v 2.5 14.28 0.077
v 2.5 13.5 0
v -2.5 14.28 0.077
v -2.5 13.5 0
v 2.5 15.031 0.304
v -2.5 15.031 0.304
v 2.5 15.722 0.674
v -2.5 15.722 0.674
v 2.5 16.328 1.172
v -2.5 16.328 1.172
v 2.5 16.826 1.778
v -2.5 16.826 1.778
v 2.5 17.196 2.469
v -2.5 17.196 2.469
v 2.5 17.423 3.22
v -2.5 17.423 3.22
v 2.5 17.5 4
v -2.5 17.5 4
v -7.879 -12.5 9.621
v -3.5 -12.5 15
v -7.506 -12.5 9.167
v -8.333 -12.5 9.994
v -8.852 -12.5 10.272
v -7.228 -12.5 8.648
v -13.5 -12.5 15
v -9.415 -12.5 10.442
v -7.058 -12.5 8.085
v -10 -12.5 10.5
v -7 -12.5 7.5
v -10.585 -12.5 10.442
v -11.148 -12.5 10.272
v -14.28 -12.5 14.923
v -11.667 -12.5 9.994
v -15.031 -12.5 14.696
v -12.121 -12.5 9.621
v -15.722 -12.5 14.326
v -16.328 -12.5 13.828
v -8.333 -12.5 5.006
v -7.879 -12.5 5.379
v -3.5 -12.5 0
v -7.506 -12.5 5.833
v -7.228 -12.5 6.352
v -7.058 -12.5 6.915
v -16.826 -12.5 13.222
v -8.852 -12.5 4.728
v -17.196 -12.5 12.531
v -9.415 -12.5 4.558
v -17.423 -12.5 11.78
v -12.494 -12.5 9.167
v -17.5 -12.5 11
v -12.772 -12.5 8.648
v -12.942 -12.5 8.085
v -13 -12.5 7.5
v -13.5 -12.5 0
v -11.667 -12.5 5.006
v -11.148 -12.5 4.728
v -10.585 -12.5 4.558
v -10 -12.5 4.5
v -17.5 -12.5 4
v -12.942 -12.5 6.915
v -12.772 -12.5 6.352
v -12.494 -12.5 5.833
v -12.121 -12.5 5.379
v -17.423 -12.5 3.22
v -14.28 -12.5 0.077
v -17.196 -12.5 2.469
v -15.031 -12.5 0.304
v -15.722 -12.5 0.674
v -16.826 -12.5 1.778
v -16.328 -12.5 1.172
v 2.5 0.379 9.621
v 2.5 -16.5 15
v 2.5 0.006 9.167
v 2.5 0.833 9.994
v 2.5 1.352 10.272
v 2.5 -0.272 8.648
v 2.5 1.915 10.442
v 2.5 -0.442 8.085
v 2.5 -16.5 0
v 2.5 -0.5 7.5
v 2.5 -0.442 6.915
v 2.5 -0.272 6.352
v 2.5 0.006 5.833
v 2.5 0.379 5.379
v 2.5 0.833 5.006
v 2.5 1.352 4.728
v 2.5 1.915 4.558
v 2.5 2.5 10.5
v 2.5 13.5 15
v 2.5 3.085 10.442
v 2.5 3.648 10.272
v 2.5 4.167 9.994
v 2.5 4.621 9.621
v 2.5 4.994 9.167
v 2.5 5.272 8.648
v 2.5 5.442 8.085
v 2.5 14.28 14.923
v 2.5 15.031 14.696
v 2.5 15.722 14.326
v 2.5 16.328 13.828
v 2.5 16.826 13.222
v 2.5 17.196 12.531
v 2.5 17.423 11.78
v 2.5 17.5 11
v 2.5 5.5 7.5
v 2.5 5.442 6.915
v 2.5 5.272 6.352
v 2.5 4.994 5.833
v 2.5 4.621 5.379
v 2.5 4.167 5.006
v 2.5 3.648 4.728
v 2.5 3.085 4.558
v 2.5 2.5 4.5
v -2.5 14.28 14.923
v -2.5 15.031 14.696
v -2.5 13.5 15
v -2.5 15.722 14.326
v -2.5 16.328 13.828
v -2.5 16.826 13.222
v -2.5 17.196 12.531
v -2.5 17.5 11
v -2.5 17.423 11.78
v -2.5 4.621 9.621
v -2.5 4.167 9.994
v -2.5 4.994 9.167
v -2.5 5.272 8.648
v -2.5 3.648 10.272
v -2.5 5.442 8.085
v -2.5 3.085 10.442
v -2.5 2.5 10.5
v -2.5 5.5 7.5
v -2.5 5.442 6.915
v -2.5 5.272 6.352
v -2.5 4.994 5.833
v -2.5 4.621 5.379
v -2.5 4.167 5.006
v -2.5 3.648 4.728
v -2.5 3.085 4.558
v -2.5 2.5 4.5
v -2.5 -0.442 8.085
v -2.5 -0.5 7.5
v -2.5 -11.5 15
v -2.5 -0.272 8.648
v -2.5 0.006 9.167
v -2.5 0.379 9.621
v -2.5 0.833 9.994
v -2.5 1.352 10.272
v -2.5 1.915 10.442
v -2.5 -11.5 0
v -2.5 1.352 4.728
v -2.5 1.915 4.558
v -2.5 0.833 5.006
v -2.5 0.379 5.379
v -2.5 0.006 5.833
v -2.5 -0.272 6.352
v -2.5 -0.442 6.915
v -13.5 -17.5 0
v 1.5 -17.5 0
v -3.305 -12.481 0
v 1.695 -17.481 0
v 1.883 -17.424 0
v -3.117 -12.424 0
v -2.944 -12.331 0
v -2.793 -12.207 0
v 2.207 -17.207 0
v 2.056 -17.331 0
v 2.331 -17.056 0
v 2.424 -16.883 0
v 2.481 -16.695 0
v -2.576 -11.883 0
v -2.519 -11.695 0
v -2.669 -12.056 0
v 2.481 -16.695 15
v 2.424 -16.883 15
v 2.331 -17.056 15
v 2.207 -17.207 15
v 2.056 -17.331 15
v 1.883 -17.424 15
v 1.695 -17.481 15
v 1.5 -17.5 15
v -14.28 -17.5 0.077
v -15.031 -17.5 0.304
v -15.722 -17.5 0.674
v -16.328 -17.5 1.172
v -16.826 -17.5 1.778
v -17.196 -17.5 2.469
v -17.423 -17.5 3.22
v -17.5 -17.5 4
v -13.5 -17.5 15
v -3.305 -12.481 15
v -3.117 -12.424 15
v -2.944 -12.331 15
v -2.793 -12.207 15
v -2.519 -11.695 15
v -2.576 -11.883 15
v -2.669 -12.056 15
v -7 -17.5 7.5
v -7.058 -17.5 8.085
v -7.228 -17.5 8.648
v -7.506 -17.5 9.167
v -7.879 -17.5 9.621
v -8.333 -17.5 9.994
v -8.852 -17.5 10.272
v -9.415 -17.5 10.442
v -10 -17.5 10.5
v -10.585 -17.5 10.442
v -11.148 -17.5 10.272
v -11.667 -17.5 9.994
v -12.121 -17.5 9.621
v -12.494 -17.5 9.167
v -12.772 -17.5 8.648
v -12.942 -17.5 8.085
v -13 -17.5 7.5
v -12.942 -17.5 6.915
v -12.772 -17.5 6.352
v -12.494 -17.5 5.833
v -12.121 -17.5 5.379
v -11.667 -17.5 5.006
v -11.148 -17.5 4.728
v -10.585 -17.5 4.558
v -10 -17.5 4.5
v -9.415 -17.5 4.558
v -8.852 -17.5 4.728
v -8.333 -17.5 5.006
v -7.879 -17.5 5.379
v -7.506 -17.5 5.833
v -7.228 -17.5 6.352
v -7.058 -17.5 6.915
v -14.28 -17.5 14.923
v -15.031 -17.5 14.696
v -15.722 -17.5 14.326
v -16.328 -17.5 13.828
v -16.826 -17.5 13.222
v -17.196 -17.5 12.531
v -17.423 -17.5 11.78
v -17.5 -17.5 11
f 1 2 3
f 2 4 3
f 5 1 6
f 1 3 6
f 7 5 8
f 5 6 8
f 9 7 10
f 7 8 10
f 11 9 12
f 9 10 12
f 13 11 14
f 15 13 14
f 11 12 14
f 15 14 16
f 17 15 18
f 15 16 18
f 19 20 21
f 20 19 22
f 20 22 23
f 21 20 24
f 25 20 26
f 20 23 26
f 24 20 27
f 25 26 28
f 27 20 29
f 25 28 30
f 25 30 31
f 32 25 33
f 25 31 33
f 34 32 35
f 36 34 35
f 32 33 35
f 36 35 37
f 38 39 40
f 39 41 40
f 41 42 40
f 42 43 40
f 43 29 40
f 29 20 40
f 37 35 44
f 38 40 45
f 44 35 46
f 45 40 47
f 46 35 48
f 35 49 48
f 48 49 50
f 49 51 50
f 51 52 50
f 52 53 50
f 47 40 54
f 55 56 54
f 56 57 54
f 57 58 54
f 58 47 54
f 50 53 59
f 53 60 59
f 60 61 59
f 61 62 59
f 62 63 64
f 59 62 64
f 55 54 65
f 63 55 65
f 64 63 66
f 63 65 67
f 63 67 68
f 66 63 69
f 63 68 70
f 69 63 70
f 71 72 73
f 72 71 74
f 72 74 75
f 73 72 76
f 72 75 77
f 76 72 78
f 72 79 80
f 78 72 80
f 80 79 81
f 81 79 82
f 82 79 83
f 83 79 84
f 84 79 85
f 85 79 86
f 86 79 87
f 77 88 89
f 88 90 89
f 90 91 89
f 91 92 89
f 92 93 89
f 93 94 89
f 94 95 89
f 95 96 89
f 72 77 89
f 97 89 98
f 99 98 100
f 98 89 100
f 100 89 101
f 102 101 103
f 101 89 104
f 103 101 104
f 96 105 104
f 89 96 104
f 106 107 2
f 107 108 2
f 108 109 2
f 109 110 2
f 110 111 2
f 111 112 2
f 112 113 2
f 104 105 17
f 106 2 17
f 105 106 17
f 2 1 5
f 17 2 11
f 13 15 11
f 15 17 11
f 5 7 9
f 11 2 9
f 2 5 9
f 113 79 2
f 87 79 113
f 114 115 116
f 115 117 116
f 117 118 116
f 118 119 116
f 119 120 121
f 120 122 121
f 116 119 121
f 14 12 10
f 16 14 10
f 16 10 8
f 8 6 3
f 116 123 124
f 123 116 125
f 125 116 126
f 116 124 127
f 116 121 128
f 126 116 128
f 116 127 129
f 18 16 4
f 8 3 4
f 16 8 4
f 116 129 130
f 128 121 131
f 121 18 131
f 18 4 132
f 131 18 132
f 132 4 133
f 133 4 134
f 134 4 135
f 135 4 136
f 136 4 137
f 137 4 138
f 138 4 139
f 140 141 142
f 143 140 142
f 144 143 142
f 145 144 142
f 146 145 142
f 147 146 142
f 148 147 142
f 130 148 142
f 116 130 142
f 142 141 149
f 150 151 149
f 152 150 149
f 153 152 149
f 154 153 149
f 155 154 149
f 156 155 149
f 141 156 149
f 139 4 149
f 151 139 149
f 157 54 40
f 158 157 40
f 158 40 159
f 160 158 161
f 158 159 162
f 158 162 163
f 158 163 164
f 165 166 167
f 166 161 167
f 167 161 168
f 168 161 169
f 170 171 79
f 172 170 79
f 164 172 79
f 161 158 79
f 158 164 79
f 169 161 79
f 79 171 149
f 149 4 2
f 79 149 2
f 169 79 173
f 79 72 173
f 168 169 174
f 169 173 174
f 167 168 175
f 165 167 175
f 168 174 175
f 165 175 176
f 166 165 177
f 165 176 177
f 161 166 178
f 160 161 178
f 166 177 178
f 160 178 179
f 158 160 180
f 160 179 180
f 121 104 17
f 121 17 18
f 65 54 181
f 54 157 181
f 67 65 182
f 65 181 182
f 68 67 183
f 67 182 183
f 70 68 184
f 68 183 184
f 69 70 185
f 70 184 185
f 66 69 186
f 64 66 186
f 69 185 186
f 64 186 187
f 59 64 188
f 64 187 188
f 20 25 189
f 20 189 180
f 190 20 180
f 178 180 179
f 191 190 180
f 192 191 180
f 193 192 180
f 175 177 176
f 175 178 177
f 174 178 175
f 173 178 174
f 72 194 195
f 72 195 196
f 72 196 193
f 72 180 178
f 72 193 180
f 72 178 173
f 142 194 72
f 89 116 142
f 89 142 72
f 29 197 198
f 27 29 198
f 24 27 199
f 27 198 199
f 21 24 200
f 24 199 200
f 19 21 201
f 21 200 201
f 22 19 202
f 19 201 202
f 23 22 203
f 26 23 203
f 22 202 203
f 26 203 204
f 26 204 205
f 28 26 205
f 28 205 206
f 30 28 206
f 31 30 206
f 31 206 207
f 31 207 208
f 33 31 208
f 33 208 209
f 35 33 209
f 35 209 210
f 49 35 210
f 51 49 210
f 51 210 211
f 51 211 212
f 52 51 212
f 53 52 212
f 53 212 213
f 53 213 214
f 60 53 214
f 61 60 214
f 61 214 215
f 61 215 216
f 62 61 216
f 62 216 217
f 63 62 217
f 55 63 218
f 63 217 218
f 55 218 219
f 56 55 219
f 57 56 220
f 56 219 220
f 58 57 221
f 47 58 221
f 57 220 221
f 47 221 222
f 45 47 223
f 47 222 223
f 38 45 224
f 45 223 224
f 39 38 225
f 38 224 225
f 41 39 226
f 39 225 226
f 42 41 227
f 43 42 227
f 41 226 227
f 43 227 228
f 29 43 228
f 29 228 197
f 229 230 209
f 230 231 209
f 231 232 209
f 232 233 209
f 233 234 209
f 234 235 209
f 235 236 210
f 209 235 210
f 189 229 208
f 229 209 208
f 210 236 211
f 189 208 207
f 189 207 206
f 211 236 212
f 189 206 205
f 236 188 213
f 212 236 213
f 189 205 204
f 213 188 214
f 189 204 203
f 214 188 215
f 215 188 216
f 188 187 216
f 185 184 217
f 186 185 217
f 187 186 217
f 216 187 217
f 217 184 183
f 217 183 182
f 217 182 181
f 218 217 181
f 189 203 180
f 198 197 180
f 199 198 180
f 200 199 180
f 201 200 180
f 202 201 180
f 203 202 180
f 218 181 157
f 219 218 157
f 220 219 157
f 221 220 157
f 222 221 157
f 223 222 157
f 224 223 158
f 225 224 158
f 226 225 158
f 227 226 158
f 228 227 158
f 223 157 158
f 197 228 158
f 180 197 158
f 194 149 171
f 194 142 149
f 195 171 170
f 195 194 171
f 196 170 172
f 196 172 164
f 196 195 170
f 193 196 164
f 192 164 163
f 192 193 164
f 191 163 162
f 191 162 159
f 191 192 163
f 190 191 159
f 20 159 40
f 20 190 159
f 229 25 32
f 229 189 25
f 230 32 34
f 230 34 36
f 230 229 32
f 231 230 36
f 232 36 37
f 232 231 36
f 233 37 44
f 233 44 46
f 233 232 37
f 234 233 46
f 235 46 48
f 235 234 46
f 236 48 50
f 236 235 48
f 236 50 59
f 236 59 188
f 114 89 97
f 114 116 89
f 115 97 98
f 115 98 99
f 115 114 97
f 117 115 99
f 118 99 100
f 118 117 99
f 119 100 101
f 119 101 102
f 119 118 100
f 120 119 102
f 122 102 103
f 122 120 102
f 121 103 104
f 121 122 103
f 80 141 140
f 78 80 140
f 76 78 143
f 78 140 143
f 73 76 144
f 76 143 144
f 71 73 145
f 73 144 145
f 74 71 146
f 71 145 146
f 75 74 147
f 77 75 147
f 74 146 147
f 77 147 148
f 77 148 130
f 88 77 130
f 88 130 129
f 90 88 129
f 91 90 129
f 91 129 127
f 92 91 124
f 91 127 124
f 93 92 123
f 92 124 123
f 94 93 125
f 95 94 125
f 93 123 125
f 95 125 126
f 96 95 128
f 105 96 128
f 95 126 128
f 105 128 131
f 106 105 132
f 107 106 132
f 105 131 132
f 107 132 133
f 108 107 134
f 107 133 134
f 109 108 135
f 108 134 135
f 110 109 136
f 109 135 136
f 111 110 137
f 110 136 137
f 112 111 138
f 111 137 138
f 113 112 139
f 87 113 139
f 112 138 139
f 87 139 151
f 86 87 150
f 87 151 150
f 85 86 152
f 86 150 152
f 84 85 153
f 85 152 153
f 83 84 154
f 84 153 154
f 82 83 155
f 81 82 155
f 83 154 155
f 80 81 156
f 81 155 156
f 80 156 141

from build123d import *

# Parameters (mm, degrees)
F5_DEPTH = 15
F0_R     = 3
F1_DEPTH = 5
F7_R     = 4
F8_R     = 1
F2_R     = 1
F3_D     = 6


with BuildPart() as f5:
    # F4 (on Top) → F5 (new body)
    with BuildSketch(Plane.XY):
        Polygon((-2.5, -17.5), (2.5, -17.5), (2.5, -12.5), (2.5, 17.5), (-2.5, 17.5), (-2.5, -12.5), (-17.5, -12.5), (-17.5, -17.5), align=None)
    extrude(amount=F5_DEPTH)

    # F0 (on face) → F1 (cut)
    with BuildSketch(Plane(origin=(-2.5, 0, 0), x_dir=(0, -1, 0), z_dir=(-1, 0, 0))):
        with Locations((-2.5, 7.5)):
            Circle(F0_R)
    extrude(amount=-F1_DEPTH, mode=Mode.SUBTRACT)

    # F7
    f7_edges = [f5.edges().sort_by_distance(p)[0] for p in [
        (0, 17.5, 15),
        (0, 17.5, 0),
        (-17.5, -15, 0),
        (-17.5, -15, 15),
    ]]
    fillet(f7_edges, radius=F7_R)

    # F8
    f8_edges = [f5.edges().sort_by_distance(p)[0] for p in [
        (-2.5, -12.5, 7.5),
    ]]
    fillet(f8_edges, radius=F8_R)

    # F2
    f2_edges = [f5.edges().sort_by_distance(p)[0] for p in [
        (2.5, -17.5, 7.5),
    ]]
    fillet(f2_edges, radius=F2_R)

    # F3 (through all)
    with Locations(Plane(origin=(0, -12.5, 0), x_dir=(-1, 0, 0), z_dir=(0, 1, 0))):
        with Locations((10, 7.5)):
            Hole(F3_D / 2)


solid = f5.part
